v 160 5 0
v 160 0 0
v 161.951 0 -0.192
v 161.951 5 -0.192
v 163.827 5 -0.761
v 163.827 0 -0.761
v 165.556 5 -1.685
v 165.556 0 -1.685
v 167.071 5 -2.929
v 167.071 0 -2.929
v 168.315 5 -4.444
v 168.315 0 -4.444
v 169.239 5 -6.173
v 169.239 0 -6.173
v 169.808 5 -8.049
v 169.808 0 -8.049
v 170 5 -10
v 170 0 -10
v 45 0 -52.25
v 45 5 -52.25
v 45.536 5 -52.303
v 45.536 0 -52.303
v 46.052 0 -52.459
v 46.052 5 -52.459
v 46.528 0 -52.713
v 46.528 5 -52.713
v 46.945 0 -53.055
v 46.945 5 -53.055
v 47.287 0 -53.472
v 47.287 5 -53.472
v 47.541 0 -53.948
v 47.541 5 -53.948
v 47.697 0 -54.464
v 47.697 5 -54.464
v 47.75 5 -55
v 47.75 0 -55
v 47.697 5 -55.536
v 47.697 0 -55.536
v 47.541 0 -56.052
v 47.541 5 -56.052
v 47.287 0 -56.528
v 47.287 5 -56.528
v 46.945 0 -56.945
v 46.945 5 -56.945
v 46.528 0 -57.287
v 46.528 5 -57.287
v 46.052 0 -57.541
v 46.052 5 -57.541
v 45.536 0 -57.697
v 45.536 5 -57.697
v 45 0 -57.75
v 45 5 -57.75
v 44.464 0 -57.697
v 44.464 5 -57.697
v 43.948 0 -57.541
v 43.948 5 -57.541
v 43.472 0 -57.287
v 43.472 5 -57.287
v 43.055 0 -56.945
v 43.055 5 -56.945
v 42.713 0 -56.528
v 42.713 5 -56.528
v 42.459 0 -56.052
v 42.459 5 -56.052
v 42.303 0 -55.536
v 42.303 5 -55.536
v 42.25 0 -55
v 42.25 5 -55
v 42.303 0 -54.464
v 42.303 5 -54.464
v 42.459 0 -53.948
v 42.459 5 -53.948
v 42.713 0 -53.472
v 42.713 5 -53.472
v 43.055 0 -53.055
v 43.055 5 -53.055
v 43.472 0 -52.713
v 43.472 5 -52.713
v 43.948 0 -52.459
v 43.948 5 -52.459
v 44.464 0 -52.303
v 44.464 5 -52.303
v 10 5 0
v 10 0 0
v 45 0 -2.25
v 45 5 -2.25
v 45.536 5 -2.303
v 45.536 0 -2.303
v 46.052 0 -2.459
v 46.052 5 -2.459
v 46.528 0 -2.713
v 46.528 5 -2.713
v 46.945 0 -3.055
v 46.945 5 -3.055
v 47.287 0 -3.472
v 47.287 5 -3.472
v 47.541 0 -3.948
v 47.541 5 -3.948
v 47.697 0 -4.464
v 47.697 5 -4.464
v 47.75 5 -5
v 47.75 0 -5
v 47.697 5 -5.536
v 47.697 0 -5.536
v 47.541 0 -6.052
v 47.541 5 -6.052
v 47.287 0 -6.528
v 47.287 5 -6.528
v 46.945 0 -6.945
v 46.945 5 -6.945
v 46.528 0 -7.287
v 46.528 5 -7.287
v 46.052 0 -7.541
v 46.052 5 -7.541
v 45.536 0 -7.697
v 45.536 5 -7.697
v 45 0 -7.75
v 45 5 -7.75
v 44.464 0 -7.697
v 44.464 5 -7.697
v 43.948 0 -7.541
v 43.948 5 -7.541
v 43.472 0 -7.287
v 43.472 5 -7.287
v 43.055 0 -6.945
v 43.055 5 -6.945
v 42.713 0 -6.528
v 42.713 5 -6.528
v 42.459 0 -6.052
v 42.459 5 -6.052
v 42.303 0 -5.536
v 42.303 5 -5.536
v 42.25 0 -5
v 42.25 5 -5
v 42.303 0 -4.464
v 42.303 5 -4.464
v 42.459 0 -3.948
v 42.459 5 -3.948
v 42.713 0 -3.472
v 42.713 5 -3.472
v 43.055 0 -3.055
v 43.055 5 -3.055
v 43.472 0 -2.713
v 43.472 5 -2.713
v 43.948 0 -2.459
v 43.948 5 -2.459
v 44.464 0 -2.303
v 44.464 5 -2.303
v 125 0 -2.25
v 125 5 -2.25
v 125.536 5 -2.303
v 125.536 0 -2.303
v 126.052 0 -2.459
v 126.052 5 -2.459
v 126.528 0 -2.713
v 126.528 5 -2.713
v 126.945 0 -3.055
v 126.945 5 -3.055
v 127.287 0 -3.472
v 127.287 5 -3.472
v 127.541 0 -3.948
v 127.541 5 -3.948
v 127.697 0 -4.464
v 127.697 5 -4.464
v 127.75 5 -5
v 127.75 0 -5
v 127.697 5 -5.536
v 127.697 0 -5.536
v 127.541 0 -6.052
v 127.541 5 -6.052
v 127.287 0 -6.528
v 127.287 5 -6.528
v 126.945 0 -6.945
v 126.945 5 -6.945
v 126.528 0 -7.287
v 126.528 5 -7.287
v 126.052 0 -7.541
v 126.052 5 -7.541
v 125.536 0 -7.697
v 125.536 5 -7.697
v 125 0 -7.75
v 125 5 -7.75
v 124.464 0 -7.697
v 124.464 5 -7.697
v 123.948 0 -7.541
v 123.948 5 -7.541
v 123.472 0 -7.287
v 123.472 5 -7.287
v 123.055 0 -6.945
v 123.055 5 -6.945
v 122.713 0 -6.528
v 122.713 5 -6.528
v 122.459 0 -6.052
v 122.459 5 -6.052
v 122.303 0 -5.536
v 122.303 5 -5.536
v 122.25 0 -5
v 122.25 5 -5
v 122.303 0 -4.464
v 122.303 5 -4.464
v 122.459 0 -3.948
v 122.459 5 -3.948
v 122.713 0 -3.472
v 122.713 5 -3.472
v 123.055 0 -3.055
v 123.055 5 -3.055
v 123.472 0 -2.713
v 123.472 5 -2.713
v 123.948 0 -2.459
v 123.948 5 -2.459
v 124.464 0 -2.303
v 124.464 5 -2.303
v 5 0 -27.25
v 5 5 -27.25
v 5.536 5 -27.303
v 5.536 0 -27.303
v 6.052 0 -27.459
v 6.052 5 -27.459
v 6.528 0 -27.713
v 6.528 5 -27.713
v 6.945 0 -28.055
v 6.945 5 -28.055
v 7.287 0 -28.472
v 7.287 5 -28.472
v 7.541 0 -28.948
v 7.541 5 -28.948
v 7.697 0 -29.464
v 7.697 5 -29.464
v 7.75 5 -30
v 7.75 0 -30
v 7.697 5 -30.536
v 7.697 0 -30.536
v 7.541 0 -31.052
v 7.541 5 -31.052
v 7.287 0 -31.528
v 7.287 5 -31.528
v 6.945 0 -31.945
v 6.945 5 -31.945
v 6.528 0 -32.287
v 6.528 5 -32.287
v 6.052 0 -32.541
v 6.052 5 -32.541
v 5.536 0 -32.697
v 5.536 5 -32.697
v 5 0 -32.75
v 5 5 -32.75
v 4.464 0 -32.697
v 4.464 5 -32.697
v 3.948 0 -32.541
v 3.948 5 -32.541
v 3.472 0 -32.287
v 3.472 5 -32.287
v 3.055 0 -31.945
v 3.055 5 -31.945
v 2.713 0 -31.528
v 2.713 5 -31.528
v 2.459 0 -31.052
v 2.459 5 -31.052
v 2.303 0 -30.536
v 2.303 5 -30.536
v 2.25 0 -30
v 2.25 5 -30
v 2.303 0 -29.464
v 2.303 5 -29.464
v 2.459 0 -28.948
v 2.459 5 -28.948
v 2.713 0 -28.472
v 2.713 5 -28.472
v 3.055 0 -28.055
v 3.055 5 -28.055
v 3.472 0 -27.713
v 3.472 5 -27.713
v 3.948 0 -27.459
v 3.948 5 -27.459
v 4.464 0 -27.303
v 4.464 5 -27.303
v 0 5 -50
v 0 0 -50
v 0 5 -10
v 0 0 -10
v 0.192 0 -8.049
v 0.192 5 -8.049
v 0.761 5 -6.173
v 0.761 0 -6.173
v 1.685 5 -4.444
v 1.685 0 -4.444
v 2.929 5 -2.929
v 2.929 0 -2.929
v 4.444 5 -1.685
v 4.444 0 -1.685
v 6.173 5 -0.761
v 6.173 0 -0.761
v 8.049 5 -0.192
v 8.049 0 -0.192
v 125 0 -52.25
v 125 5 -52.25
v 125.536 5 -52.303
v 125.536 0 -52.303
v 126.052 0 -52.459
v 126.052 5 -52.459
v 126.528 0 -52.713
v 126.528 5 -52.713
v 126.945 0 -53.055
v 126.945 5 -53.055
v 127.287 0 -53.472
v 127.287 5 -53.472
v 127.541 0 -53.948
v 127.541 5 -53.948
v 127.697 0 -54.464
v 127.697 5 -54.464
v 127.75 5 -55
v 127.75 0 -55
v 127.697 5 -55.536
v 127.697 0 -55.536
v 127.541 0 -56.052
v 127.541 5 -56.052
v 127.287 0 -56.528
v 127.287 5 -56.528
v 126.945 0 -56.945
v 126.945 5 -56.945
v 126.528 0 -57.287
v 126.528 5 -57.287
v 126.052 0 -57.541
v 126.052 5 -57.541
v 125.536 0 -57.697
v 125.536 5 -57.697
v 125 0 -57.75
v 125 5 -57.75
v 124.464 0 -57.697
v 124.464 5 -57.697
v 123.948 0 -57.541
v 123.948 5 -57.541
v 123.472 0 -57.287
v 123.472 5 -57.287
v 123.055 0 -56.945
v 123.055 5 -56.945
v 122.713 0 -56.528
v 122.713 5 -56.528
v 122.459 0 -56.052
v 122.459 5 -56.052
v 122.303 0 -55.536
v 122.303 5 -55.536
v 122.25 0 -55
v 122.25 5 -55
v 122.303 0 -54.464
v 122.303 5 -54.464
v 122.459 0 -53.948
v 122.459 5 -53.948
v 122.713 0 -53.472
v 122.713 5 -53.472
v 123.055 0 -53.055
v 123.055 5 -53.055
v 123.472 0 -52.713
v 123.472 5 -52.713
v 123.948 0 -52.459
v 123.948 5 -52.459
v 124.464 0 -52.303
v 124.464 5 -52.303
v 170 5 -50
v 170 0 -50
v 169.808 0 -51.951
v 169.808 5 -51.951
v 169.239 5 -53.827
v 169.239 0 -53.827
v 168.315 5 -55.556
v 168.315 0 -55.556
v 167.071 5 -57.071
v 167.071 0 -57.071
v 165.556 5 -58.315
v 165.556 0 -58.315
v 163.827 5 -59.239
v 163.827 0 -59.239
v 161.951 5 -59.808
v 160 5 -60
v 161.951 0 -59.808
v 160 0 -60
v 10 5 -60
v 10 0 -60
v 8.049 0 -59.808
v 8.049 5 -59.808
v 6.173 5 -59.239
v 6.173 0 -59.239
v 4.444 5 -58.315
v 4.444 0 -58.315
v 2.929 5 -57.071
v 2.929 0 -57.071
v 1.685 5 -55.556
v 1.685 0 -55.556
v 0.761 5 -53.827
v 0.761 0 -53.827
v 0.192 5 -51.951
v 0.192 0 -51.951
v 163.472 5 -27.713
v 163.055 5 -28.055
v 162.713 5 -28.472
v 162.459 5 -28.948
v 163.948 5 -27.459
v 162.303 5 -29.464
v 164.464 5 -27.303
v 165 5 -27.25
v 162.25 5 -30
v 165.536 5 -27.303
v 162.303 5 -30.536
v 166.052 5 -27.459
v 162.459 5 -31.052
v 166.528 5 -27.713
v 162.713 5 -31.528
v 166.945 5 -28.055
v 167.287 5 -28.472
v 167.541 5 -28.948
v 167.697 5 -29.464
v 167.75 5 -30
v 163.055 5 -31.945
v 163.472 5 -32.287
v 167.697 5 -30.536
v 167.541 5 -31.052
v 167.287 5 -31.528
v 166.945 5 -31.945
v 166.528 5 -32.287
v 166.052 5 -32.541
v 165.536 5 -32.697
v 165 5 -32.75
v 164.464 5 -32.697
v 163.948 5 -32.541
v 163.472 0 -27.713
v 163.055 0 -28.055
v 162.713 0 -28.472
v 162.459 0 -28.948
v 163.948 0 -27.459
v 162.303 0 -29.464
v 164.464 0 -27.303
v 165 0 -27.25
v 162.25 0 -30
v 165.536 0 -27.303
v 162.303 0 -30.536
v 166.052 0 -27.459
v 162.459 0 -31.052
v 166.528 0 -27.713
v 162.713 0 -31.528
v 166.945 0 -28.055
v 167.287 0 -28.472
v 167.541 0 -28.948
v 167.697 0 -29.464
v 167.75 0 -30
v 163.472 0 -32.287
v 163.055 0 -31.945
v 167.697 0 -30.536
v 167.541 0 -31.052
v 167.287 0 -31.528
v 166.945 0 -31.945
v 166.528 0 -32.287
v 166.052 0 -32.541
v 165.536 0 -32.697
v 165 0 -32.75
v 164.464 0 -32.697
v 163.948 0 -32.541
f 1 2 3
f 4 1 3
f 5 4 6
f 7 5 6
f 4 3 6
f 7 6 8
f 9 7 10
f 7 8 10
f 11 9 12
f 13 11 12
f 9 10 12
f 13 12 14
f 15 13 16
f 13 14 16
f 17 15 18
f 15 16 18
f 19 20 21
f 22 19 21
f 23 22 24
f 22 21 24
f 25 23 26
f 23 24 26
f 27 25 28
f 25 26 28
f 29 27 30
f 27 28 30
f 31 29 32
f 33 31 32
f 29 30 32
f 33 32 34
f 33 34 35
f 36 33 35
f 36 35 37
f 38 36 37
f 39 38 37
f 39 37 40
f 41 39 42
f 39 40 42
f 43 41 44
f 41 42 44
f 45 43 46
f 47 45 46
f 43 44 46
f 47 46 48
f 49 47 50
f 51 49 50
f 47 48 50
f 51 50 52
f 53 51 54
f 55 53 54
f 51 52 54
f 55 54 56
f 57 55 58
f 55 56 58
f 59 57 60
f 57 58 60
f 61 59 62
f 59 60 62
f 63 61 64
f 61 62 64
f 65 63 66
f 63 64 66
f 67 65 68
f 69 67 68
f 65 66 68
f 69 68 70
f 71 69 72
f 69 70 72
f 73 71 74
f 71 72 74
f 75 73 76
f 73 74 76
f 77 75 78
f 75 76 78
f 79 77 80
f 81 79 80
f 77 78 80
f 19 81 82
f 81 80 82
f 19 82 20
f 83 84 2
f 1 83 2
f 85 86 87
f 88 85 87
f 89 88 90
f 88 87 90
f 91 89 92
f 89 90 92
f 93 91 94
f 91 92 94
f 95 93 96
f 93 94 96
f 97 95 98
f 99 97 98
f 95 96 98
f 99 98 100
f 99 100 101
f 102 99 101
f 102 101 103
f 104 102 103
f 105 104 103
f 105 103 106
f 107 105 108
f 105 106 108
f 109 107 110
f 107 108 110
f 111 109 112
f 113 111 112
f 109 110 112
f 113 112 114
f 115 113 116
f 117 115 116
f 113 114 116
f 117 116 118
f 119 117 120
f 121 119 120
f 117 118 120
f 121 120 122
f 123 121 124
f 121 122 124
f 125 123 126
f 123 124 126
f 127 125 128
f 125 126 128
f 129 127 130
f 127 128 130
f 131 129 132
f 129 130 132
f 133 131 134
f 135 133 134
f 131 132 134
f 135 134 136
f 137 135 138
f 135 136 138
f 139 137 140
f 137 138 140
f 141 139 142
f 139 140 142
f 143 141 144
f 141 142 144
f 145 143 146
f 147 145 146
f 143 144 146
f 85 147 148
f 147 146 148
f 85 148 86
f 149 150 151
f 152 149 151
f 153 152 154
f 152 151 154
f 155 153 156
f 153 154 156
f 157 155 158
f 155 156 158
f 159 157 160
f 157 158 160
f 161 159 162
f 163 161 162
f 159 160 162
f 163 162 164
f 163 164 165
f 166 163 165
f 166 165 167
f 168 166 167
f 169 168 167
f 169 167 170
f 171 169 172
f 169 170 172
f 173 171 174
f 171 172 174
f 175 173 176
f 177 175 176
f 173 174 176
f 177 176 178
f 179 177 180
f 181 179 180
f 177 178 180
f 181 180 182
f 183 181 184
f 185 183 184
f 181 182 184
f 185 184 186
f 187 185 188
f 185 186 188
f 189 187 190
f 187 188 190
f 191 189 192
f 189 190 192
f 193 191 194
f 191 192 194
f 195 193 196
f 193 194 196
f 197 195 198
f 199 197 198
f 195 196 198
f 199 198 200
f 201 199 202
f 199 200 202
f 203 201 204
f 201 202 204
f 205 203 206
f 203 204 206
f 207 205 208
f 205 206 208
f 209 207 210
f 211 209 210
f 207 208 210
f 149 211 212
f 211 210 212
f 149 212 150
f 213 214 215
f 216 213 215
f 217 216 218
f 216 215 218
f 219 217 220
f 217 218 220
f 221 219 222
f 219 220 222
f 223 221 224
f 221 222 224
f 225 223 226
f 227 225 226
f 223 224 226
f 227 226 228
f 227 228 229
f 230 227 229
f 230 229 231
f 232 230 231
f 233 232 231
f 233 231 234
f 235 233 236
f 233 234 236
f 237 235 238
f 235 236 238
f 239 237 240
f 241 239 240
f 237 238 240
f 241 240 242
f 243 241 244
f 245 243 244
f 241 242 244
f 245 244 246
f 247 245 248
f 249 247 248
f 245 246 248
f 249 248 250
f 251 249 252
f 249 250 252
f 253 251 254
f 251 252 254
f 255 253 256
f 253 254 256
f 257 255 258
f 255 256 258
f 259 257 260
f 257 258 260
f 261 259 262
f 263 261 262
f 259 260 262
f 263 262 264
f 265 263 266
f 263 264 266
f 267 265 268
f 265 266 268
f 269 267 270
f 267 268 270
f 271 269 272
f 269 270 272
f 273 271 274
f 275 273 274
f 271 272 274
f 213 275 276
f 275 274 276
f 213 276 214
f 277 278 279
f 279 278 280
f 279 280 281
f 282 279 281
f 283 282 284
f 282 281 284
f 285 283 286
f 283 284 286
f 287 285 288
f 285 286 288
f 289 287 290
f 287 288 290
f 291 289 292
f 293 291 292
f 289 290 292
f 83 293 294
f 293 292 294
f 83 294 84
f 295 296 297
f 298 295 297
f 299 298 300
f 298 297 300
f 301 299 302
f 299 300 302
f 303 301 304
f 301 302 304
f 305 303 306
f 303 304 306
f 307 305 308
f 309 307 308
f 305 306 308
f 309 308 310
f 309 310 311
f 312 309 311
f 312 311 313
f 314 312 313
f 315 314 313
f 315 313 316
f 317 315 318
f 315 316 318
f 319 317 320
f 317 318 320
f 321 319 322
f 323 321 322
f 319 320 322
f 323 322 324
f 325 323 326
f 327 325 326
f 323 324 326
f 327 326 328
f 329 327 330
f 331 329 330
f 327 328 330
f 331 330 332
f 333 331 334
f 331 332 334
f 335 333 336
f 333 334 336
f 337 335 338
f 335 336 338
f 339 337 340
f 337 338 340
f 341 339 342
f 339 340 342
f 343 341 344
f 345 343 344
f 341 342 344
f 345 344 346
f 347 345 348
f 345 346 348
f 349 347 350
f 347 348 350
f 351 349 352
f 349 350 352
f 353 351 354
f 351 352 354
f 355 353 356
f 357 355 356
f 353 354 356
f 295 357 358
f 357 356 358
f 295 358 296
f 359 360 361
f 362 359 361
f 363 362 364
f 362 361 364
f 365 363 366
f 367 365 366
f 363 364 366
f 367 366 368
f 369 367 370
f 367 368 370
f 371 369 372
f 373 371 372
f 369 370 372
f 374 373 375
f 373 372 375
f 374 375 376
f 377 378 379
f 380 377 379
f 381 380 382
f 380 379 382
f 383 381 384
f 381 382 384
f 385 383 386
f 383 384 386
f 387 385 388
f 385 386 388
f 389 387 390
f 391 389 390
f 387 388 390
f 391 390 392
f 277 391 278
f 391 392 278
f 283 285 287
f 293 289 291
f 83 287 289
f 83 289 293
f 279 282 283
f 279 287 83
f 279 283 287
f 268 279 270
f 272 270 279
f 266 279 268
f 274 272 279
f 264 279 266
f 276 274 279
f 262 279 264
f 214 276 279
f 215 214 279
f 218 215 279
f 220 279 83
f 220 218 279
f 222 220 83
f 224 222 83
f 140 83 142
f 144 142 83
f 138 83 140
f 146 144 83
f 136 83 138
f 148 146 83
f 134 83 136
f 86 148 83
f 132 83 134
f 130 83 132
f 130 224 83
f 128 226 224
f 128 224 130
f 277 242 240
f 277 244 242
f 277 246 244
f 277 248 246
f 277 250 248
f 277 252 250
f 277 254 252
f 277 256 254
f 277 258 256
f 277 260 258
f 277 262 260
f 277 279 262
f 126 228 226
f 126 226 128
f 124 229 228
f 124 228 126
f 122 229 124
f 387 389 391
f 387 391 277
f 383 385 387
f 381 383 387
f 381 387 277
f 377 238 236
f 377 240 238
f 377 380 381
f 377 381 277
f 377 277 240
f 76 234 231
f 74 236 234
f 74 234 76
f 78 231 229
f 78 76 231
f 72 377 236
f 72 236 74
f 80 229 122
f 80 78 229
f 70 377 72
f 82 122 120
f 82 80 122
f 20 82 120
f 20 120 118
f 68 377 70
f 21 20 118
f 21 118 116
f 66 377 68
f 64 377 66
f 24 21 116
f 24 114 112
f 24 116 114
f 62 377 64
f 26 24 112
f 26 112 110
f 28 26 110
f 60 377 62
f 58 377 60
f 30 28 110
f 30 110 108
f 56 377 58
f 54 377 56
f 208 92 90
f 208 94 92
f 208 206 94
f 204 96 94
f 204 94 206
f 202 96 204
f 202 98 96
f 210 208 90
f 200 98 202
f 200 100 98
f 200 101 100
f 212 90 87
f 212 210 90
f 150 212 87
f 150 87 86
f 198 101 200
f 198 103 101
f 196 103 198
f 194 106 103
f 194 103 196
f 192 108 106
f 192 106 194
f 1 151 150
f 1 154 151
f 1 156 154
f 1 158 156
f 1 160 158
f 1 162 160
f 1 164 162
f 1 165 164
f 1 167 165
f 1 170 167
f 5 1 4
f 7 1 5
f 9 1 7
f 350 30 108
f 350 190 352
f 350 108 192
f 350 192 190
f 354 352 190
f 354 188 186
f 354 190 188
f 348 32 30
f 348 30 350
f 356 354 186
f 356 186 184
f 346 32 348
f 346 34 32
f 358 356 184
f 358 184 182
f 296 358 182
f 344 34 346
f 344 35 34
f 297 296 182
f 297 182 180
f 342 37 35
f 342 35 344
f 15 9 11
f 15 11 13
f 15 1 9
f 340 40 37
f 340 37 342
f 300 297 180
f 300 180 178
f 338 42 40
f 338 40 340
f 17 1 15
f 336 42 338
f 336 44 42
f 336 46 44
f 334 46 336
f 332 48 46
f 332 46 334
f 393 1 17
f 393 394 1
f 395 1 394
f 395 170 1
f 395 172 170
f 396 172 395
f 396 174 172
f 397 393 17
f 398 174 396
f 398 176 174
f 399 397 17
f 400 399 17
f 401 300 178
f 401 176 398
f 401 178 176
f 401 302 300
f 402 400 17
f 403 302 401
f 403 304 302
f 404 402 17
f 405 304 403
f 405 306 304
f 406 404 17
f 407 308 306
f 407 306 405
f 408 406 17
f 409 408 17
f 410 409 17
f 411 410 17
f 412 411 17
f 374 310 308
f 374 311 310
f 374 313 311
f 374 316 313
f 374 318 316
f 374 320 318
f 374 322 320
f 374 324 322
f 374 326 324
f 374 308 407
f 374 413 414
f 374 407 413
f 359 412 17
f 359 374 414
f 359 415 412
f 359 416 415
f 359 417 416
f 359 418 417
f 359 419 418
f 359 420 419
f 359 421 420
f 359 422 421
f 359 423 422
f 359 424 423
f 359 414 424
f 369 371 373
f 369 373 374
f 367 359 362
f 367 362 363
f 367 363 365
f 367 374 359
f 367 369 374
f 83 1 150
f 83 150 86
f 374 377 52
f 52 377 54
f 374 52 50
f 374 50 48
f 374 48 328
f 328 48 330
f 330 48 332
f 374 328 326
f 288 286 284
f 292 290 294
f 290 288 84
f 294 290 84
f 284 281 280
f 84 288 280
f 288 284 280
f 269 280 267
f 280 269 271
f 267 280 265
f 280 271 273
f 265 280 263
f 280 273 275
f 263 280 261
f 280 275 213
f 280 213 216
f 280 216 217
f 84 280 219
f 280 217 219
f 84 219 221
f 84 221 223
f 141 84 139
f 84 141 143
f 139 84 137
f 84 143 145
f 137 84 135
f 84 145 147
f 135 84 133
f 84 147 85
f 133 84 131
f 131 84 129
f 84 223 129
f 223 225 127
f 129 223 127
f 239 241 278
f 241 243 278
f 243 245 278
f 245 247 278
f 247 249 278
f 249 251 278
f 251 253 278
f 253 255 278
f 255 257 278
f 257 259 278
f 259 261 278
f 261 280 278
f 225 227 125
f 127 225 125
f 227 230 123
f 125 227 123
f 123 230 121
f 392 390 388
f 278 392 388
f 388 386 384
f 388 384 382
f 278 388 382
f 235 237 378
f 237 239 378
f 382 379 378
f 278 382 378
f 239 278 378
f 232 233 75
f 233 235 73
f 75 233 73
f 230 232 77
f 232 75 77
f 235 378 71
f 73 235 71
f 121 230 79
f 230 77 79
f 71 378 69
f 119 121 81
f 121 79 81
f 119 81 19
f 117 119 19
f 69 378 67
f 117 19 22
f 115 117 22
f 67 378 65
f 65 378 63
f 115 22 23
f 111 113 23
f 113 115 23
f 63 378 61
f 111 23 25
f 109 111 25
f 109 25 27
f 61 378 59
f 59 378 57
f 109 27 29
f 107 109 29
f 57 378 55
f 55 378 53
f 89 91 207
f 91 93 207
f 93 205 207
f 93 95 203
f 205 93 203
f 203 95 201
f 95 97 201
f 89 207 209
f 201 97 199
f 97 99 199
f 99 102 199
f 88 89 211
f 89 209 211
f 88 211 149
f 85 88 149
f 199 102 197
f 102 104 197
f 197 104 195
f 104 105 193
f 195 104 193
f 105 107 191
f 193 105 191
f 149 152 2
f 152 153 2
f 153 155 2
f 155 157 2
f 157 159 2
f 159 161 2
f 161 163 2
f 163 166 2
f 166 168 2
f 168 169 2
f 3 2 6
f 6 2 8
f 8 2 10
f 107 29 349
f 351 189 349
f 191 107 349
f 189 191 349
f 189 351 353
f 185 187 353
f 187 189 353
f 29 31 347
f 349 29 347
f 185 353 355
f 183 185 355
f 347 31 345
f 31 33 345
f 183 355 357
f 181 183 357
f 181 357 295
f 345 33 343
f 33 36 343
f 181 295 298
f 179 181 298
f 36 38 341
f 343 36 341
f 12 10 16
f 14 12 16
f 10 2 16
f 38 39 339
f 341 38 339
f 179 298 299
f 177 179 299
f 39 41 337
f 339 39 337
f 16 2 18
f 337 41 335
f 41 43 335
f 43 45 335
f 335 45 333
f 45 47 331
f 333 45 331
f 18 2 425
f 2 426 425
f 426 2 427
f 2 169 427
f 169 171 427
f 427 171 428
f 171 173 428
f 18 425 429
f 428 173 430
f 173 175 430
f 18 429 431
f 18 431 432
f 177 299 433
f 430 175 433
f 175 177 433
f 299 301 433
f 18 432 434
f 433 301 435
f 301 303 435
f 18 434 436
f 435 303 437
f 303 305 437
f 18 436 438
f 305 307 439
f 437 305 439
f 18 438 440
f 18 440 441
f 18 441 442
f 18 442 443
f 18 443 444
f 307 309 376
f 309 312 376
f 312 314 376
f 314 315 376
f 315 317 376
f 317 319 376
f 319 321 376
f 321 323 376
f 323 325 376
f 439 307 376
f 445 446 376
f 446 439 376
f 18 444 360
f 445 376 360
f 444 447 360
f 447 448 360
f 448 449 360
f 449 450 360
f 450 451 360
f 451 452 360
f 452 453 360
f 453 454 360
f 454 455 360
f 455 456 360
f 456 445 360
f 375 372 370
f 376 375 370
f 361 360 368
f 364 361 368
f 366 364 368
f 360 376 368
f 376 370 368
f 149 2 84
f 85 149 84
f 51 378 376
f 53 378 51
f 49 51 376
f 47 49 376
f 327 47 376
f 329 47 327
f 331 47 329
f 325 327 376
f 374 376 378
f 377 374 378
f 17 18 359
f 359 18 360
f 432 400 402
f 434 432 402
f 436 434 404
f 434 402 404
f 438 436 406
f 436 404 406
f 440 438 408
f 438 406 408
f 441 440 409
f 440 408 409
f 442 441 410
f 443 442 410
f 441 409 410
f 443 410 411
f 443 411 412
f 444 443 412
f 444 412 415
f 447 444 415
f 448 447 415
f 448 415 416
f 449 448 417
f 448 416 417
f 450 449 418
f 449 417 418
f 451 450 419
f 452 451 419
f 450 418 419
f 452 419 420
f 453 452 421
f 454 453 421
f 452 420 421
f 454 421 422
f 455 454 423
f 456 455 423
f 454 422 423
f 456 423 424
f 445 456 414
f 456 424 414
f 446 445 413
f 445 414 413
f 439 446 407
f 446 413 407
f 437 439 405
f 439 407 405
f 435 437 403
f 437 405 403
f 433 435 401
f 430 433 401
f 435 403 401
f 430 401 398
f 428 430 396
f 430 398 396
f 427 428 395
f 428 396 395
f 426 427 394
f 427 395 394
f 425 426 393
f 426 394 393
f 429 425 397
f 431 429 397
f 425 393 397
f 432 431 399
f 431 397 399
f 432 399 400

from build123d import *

# Parameters (mm, degrees)
BOSS_EXTRUDE2_DEPTH = 5
SKETCH3_R           = 2.75
CUT_EXTRUDE1_DEPTH  = 5


with BuildPart() as part:
    # Sketch1 → Boss-Extrude2 (new body)
    with BuildSketch(Plane(origin=(0, 0, 0), x_dir=(1, 0, 0), z_dir=(0, 1, 0))):
        with BuildLine():
            Line((10, 0), (160, 0))
            ThreePointArc((160, 0), (167.071067812, 2.928932188), (170, 10))
            Line((170, 10), (170, 50))
            ThreePointArc((170, 50), (167.071067812, 57.071067812), (160, 60))
            Line((160, 60), (10, 60))
            ThreePointArc((10, 60), (2.928932188, 57.071067812), (0, 50))
            Line((0, 50), (0, 10))
            ThreePointArc((0, 10), (2.928932188, 2.928932188), (10, 0))
        make_face()
    extrude(amount=BOSS_EXTRUDE2_DEPTH)

    # Sketch3 → Cut-Extrude1 (cut)
    with BuildSketch(Plane(origin=(0, 5, 0), x_dir=(1, 0, 0), z_dir=(0, 1, 0))):
        with Locations(Location((5, 30, 0), (0, 0, 270))):
            Circle(SKETCH3_R)
        with Locations(Location((45, 55, 0), (0, 0, 270))):
            Circle(SKETCH3_R)
        with Locations(Location((125, 55, 0), (0, 0, 270))):
            Circle(SKETCH3_R)
        with Locations(Location((165, 30, 0), (0, 0, 270))):
            Circle(SKETCH3_R)
        with Locations(Location((125, 5, 0), (0, 0, 270))):
            Circle(SKETCH3_R)
        with Locations(Location((45, 5, 0), (0, 0, 270))):
            Circle(SKETCH3_R)
    extrude(amount=-CUT_EXTRUDE1_DEPTH, mode=Mode.SUBTRACT)


solid = part.part
